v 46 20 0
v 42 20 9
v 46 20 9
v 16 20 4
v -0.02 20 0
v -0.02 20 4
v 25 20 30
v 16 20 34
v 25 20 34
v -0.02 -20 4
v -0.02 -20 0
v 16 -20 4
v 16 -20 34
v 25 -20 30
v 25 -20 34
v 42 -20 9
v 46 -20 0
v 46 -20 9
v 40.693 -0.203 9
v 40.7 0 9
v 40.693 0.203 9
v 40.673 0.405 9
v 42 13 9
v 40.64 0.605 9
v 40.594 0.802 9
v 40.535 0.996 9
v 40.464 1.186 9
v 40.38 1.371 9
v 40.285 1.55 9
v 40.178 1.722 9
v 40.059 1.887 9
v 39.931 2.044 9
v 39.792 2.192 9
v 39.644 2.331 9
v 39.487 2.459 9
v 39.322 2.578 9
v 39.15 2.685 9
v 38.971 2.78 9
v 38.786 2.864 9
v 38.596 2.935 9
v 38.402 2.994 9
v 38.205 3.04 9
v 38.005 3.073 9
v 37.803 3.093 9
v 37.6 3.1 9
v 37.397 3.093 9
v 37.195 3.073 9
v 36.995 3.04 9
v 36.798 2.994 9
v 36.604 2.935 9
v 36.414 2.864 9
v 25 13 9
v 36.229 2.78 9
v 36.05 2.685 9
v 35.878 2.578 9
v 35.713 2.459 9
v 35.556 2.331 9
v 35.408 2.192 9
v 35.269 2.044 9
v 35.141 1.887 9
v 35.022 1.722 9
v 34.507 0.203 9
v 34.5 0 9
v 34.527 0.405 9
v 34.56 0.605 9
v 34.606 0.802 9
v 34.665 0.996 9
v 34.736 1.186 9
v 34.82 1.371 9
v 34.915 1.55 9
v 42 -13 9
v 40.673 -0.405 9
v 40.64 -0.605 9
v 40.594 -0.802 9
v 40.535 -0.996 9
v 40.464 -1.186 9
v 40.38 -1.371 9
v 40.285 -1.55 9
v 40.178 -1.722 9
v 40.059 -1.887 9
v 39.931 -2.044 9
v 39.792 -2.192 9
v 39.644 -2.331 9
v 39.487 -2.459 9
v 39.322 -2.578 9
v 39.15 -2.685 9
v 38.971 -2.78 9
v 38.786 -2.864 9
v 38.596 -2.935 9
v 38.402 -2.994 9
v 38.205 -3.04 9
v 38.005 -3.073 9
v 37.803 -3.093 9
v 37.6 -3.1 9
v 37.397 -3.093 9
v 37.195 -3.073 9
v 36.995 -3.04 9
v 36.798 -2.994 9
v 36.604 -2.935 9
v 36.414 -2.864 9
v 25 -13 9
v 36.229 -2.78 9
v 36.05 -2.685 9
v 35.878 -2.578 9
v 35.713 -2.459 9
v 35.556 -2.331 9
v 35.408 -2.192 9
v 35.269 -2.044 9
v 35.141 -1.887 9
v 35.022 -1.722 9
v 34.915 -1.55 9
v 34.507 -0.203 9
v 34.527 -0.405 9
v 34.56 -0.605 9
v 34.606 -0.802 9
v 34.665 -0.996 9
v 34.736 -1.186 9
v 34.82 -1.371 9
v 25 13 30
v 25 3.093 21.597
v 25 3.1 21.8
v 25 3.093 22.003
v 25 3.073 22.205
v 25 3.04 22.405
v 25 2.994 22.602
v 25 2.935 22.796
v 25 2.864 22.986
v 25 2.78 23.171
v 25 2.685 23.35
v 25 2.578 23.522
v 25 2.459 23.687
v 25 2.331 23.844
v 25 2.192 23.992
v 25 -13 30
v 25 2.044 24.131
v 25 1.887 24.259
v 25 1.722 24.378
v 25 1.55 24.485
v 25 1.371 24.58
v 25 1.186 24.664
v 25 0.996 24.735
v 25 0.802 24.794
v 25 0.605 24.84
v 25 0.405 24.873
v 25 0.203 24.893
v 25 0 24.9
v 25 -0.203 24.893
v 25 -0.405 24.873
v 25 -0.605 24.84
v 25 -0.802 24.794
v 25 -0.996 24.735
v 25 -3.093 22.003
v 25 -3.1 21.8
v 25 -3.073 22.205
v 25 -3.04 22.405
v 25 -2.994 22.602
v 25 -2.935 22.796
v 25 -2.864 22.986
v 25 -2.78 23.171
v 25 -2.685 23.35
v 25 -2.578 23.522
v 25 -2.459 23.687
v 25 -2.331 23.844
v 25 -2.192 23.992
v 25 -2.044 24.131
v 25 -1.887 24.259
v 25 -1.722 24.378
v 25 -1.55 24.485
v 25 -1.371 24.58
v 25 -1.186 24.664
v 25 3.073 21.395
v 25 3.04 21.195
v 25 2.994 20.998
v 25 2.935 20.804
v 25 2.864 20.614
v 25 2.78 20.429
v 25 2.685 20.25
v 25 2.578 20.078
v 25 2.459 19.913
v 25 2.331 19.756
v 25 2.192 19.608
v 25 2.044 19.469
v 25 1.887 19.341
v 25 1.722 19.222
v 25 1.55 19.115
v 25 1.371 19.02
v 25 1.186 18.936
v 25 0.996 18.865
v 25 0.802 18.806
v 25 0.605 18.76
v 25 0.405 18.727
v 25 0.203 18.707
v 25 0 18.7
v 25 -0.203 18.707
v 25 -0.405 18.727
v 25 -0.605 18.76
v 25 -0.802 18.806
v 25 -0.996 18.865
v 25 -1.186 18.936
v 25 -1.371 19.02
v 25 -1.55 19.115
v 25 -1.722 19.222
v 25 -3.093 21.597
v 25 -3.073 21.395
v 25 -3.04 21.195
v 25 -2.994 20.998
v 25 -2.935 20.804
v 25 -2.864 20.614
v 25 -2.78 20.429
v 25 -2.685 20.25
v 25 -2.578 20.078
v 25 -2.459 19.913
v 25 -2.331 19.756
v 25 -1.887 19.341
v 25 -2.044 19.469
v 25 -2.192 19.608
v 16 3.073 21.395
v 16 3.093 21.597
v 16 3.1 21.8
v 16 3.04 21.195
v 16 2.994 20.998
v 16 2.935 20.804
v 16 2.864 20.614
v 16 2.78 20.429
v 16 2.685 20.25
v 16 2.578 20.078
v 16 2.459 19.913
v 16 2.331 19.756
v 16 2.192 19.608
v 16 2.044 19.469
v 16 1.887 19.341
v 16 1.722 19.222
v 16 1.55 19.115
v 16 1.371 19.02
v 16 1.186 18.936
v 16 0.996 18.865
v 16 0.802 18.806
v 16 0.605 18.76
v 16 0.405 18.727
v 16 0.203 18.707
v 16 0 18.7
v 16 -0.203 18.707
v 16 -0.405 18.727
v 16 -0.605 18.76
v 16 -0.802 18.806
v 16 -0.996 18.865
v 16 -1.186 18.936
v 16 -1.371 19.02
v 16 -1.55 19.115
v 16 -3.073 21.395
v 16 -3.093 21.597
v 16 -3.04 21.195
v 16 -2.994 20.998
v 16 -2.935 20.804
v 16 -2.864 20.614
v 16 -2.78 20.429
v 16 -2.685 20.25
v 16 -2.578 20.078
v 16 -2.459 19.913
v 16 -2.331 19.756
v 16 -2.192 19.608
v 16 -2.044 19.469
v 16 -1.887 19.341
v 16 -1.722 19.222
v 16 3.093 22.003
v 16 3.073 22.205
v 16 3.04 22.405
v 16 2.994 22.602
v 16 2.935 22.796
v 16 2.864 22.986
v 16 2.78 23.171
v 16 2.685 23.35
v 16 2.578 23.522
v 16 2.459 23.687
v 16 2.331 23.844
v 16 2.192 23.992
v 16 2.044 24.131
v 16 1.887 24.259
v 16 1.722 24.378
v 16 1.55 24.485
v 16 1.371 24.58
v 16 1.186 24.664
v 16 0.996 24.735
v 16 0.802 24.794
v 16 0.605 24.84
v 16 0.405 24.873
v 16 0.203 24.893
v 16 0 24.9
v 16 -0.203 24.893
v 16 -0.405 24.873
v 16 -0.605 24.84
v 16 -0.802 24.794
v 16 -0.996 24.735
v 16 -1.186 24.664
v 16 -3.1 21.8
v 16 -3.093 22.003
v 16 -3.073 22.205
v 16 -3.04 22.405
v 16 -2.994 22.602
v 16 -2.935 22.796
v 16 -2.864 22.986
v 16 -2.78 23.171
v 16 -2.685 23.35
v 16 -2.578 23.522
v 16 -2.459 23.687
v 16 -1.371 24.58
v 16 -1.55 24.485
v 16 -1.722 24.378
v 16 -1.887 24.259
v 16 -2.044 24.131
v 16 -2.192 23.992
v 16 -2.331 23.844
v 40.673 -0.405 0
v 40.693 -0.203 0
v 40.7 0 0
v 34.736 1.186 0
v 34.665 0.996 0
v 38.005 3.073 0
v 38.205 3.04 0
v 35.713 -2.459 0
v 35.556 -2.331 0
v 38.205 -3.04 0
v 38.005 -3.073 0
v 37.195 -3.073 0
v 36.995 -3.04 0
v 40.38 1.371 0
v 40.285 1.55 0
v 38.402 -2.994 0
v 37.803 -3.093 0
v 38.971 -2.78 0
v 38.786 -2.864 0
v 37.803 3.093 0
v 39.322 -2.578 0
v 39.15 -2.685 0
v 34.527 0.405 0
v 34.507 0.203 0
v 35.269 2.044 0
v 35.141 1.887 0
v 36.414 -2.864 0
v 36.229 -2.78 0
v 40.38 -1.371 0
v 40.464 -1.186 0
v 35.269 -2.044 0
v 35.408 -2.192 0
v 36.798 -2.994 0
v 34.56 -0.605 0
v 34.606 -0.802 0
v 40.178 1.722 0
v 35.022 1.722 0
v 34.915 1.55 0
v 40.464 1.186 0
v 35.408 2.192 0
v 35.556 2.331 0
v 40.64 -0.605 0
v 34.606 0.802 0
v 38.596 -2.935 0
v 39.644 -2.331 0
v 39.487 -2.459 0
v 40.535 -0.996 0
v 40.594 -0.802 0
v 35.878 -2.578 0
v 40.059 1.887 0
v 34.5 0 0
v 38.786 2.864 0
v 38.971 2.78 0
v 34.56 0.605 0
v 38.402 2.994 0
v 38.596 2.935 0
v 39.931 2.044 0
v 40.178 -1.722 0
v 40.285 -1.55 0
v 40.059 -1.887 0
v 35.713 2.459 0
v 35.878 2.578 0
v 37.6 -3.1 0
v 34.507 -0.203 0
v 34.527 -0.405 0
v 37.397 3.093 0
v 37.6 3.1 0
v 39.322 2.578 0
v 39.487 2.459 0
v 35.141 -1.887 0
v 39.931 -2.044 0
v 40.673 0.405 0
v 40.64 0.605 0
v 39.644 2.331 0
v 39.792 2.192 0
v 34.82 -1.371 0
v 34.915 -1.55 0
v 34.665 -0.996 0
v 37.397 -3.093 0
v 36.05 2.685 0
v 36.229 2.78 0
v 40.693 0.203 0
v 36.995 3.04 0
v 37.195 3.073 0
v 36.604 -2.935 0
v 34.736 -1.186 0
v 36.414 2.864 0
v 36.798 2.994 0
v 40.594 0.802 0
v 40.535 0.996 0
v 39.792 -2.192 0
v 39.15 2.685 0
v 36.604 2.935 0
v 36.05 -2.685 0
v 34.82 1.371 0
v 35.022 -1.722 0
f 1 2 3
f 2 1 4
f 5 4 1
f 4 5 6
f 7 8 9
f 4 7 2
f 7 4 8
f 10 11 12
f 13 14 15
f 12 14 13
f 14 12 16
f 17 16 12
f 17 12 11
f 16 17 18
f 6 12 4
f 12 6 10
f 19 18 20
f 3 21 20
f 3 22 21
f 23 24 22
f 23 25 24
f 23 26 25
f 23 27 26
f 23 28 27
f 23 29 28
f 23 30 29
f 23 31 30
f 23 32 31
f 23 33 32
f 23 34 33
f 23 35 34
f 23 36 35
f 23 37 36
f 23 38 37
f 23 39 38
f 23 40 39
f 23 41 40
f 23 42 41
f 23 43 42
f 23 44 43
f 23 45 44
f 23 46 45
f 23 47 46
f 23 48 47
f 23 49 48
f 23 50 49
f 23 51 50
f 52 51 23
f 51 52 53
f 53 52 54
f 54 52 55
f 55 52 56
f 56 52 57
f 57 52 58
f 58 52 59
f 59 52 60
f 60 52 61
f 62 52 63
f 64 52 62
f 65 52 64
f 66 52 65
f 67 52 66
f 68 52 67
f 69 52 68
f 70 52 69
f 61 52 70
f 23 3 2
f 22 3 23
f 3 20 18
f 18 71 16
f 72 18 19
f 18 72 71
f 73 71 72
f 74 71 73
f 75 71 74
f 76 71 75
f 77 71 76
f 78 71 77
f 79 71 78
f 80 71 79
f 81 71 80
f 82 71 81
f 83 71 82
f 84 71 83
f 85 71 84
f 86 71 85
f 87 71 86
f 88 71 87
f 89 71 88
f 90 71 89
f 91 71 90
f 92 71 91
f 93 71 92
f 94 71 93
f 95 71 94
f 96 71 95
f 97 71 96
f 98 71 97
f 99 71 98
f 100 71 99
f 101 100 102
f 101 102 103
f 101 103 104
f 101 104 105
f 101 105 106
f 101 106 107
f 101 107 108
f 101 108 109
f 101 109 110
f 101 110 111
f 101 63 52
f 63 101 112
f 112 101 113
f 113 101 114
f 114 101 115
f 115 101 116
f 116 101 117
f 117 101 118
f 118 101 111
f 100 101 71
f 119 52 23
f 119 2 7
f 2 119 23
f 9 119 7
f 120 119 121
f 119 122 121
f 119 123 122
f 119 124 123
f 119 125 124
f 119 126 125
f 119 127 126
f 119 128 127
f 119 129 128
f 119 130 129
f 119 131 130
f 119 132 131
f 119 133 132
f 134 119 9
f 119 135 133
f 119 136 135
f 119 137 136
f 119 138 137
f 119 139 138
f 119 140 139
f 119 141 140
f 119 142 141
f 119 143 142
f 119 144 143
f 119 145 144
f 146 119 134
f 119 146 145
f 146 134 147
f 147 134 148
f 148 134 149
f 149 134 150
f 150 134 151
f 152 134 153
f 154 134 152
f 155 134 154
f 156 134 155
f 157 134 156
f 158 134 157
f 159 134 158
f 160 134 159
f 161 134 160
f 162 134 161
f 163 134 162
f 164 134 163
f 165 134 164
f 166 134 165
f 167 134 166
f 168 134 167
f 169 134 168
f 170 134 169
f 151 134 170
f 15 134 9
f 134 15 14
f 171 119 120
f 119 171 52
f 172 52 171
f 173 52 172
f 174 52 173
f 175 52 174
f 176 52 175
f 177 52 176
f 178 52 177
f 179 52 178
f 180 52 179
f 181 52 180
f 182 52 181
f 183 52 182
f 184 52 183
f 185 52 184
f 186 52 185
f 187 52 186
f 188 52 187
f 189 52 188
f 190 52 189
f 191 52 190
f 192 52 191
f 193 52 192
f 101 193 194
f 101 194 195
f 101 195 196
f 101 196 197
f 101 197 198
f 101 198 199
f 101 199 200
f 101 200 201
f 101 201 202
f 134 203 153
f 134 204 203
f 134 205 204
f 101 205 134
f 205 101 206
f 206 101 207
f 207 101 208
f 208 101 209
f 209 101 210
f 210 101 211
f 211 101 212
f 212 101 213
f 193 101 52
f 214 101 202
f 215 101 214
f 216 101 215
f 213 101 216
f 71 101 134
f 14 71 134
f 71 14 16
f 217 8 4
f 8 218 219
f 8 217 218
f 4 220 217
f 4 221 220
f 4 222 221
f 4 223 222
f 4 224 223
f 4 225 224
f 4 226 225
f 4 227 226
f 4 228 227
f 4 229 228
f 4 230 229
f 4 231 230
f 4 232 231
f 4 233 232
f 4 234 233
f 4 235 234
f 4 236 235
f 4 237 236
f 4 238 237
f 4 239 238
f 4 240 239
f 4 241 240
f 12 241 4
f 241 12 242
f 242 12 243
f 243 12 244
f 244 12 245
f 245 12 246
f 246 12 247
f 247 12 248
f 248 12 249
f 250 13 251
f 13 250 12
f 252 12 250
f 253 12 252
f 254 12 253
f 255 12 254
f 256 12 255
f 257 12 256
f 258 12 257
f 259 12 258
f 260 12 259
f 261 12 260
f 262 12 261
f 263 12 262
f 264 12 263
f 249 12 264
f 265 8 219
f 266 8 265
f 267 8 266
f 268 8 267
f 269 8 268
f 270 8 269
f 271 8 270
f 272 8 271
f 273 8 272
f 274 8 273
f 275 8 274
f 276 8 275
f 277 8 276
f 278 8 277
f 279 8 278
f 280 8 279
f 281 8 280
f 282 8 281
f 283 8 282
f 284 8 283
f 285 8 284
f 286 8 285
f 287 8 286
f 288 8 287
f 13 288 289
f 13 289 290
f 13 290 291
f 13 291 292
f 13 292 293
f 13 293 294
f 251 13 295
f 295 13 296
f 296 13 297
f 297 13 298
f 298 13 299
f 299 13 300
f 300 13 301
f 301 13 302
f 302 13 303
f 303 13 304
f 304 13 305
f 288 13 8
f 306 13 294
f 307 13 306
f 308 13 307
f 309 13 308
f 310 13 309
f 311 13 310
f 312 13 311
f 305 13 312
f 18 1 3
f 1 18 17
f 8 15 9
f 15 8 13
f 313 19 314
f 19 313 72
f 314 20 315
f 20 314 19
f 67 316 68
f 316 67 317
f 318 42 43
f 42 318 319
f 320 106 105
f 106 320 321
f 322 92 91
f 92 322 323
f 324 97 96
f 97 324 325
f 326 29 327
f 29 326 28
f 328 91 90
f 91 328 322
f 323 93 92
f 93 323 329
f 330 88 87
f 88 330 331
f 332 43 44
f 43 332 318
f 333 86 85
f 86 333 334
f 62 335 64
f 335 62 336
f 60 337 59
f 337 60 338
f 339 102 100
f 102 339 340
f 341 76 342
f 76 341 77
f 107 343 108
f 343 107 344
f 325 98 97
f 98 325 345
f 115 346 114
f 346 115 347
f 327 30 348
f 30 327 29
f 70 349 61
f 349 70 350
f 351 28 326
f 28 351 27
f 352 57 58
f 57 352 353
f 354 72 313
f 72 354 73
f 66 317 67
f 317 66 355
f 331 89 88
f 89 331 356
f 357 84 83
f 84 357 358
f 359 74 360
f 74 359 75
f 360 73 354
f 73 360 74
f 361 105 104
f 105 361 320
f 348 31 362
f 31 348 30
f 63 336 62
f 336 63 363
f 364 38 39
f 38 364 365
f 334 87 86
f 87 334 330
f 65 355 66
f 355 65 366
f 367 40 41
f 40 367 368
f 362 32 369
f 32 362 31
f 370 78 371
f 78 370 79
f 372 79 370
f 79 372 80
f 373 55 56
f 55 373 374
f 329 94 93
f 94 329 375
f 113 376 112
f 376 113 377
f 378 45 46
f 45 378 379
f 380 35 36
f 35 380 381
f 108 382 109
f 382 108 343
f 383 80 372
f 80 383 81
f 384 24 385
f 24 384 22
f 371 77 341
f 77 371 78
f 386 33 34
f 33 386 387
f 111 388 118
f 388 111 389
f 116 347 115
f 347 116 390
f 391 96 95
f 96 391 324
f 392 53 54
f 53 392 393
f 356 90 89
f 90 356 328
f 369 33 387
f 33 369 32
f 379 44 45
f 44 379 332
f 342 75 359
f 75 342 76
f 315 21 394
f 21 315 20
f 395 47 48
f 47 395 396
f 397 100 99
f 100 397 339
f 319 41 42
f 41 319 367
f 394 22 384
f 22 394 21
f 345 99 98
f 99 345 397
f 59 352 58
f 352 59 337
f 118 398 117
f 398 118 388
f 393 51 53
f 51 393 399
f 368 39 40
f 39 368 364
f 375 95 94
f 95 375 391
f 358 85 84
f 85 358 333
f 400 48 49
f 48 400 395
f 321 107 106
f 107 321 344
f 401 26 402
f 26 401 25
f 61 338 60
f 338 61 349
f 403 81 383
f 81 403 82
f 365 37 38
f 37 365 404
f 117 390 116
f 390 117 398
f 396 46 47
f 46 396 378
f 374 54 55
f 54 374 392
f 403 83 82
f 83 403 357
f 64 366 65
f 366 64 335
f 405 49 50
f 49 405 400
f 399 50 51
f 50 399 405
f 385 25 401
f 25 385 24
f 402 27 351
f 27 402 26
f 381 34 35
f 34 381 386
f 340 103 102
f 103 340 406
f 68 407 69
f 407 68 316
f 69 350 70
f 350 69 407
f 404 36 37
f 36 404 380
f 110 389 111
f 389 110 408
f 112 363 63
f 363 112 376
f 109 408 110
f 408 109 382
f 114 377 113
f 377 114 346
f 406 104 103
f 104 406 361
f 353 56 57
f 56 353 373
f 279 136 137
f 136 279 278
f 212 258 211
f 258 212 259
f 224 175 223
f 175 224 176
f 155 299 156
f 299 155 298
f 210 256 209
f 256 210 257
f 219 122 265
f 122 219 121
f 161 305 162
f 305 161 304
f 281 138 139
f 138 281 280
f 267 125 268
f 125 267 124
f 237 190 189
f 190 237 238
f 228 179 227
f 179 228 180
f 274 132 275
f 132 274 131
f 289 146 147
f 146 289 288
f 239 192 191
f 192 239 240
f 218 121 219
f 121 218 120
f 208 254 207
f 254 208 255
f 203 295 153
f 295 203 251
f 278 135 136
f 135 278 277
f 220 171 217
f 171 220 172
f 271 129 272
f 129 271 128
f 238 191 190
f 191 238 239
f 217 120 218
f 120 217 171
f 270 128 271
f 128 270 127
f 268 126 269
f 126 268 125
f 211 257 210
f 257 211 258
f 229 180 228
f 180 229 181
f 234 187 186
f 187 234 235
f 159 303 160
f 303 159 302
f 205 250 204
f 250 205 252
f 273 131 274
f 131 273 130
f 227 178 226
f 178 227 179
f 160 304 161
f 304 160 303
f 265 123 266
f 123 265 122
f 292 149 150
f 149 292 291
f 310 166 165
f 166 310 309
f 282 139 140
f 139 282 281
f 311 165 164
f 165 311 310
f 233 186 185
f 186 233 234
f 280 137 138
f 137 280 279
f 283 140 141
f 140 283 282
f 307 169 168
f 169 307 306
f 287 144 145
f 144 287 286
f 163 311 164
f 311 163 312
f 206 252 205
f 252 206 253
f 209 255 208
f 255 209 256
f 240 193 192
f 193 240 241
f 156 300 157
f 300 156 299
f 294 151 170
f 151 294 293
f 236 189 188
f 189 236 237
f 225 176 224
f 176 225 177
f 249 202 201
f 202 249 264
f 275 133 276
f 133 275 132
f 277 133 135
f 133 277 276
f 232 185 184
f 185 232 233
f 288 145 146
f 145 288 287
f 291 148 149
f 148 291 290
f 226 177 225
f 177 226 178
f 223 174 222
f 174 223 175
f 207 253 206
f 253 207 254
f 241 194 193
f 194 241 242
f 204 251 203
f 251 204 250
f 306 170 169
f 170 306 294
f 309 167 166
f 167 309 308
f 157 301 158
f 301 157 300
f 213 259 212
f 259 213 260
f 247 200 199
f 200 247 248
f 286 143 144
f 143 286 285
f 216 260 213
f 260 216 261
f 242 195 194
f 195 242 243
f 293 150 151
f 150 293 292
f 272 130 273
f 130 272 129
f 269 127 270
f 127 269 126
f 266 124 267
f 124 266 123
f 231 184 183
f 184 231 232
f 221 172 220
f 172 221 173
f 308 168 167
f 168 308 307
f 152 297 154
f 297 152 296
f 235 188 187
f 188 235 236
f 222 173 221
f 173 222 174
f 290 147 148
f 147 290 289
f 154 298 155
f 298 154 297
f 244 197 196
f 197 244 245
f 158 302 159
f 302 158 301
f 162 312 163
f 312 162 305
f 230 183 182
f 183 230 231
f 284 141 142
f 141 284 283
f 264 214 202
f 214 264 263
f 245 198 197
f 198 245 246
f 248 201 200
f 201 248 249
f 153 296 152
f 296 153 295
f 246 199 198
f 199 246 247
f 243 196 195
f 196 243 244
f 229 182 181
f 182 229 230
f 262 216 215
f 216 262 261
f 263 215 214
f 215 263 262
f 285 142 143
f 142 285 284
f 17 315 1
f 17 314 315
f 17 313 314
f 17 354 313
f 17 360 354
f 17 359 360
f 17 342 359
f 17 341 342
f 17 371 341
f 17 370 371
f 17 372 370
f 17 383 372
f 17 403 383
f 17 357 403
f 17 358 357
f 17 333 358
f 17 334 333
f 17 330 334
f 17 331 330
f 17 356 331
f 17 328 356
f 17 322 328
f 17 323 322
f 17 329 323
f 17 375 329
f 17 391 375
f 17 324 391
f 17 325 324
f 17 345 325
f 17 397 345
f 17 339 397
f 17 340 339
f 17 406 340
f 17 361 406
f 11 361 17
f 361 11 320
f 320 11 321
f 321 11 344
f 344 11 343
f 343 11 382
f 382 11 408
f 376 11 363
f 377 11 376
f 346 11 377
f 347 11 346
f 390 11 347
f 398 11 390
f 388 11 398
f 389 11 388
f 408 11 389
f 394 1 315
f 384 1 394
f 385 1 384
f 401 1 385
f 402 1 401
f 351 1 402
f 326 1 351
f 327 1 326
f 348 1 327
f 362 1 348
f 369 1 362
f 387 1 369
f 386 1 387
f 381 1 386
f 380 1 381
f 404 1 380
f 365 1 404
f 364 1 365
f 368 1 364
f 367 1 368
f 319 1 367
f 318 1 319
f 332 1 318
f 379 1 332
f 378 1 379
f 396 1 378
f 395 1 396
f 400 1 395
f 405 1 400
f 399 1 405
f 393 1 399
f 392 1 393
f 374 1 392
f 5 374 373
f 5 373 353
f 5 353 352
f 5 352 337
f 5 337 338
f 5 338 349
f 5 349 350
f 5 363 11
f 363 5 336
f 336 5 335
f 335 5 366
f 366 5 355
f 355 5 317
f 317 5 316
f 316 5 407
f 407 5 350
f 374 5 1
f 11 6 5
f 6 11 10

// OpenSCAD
// file: paired_reinforcement_bracket.scad
// ============================================================
// Paired Reinforcement Bracket on ABS Substrate
//
// Two mirrored copies of a reinforcement bracket are mounted
// back-to-back on a shared flat substrate. The gap is measured
// as the clear distance between the inner upright faces.
//
// Standalone — no external dependencies.
//
// All units: millimeters.
// ============================================================

/* [Bracket Dimensions] */
leg_length              = 30;
face_width              = 40;
vertical_wall_thickness = 9;     // Thickness of the upright leg
bottom_thickness        = 5;     // Thickness of the horizontal leg (bottom part with holes)

/* [Bracing] */
gusset_band_width       = 7;
gusset_end_margin       = 4;

/* [Mounting Holes] */
bottom_hole_diameter    = 6.2;
vertical_hole_diameter  = 6.2;
bottom_hole_outboard_offset = 7;
vertical_hole_raise     = 2;

/* [Pair Layout] */
gap_between_brackets    = 32;    // Clear gap between inner upright faces

/* [Substrate] */
substrate_thickness     = 4;
substrate_end_margin    = 0;
substrate_side_margin   = 0;

/* [Quality] */
$fn                     = 96;
$fa                     = 2;
$fs                     = 0.4;

// ============================================================
// DERIVED
// ============================================================

half_face_width         = face_width / 2;
gusset_band             = min(gusset_band_width, face_width / 2 - 0.2);
gusset_center_offset    = half_face_width - gusset_band / 2;
substrate_length        = gap_between_brackets + 2 * leg_length + 2 * substrate_end_margin;
substrate_width         = face_width + 2 * substrate_side_margin;
bottom_hole_center_from_corner = leg_length / 2 + bottom_hole_outboard_offset;
vertical_hole_center_from_corner = leg_length / 2 + vertical_hole_raise;
substrate_hole_center_x = gap_between_brackets / 2 + bottom_hole_center_from_corner;

// ============================================================
// HELPERS
// ============================================================

module flat_rect_2d(w, h) {
    square([w, h], center = true);
}

module outer_gusset_profile() {
    polygon(points = [
        [vertical_wall_thickness, bottom_thickness],
        [leg_length - gusset_end_margin, bottom_thickness],
        [vertical_wall_thickness, leg_length - gusset_end_margin]
    ]);
}

// ============================================================
// SINGLE BRACKET GEOMETRY (standalone, no external dependencies)
// ============================================================

module horizontal_leg() {
    translate([leg_length / 2, bottom_thickness / 2, 0])
        rotate([90, 0, 0])
            linear_extrude(height = bottom_thickness, center = true)
                flat_rect_2d(leg_length, face_width);
}

module vertical_leg() {
    translate([vertical_wall_thickness / 2, leg_length / 2, 0])
        rotate([0, 90, 0])
            linear_extrude(height = vertical_wall_thickness, center = true)
                flat_rect_2d(face_width, leg_length);
}

module side_gussets() {
    for (side = [-1, 1])
        translate([0, 0, side * gusset_center_offset])
            linear_extrude(height = gusset_band, center = true)
                outer_gusset_profile();
}

module centered_holes(
    horizontal_hole_center_from_corner,
    vertical_hole_center_from_corner,
    horizontal_hole_diameter,
    vertical_hole_diameter
) {
    translate([horizontal_hole_center_from_corner, bottom_thickness / 2, 0])
        rotate([90, 0, 0])
            cylinder(h = bottom_thickness + 0.4, d = horizontal_hole_diameter, center = true);

    translate([vertical_wall_thickness / 2, vertical_hole_center_from_corner, 0])
        rotate([0, 90, 0])
            cylinder(h = vertical_wall_thickness + 0.4, d = vertical_hole_diameter, center = true);
}

module single_bracket(
    horizontal_hole_center_from_corner,
    vertical_hole_center_from_corner,
    horizontal_hole_diameter,
    vertical_hole_diameter
) {
    difference() {
        union() {
            horizontal_leg();
            vertical_leg();
            side_gussets();
        }
        centered_holes(
            horizontal_hole_center_from_corner = horizontal_hole_center_from_corner,
            vertical_hole_center_from_corner = vertical_hole_center_from_corner,
            horizontal_hole_diameter = horizontal_hole_diameter,
            vertical_hole_diameter = vertical_hole_diameter
        );
    }
}

// ============================================================
// PAIRED BRACKET GEOMETRY
// ============================================================

module substrate_plate() {
    translate([0, 0, substrate_thickness / 2])
        cube([substrate_length, substrate_width, substrate_thickness], center = true);
}

module upright_bracket() {
    rotate([90, 0, 0])
        single_bracket(
            horizontal_hole_center_from_corner = bottom_hole_center_from_corner,
            vertical_hole_center_from_corner = vertical_hole_center_from_corner,
            horizontal_hole_diameter = bottom_hole_diameter,
            vertical_hole_diameter = vertical_hole_diameter
        );
}

module left_bracket() {
    translate([-gap_between_brackets / 2, 0, substrate_thickness])
        mirror([1, 0, 0])
            upright_bracket();
}

module right_bracket() {
    translate([gap_between_brackets / 2, 0, substrate_thickness])
        upright_bracket();
}

module substrate_mount_holes() {
    for (side = [-1, 1])
        translate([side * substrate_hole_center_x, 0, substrate_thickness / 2])
            cylinder(h = substrate_thickness + 0.4, d = bottom_hole_diameter, center = true);
}

module paired_reinforcement_bracket() {
    difference() {
        union() {
            substrate_plate();
            left_bracket();
            right_bracket();
        }
        substrate_mount_holes();
    }
}

color("DarkOrange")
    paired_reinforcement_bracket();
// main file
// ============================================================
// Paired Reinforcement Bracket Half-Test Prototype
//
// Keeps one side of the paired bracket so a single flat hole and
// a single upright hole can be test-printed quickly in PLA.
// ============================================================

use <paired_reinforcement_bracket.scad>

/* [Prototype Cut] */
keep_side               = "right"; // right, left
cut_overlap             = 0.02;

/* [Quality] */
$fn                     = 96;
$fa                     = 2;
$fs                     = 0.4;

module cut_half_space(side = "right") {
    if (side == "right")
        translate([250 - cut_overlap / 2, 0, 0])
            cube([500 + cut_overlap, 500, 500], center = true);
    else
        translate([-250 + cut_overlap / 2, 0, 0])
            cube([500 + cut_overlap, 500, 500], center = true);
}

module paired_reinforcement_bracket_half_test() {
    intersection() {
        paired_reinforcement_bracket();
        cut_half_space(keep_side);
    }
}

color("DarkOrange")
    paired_reinforcement_bracket_half_test();
